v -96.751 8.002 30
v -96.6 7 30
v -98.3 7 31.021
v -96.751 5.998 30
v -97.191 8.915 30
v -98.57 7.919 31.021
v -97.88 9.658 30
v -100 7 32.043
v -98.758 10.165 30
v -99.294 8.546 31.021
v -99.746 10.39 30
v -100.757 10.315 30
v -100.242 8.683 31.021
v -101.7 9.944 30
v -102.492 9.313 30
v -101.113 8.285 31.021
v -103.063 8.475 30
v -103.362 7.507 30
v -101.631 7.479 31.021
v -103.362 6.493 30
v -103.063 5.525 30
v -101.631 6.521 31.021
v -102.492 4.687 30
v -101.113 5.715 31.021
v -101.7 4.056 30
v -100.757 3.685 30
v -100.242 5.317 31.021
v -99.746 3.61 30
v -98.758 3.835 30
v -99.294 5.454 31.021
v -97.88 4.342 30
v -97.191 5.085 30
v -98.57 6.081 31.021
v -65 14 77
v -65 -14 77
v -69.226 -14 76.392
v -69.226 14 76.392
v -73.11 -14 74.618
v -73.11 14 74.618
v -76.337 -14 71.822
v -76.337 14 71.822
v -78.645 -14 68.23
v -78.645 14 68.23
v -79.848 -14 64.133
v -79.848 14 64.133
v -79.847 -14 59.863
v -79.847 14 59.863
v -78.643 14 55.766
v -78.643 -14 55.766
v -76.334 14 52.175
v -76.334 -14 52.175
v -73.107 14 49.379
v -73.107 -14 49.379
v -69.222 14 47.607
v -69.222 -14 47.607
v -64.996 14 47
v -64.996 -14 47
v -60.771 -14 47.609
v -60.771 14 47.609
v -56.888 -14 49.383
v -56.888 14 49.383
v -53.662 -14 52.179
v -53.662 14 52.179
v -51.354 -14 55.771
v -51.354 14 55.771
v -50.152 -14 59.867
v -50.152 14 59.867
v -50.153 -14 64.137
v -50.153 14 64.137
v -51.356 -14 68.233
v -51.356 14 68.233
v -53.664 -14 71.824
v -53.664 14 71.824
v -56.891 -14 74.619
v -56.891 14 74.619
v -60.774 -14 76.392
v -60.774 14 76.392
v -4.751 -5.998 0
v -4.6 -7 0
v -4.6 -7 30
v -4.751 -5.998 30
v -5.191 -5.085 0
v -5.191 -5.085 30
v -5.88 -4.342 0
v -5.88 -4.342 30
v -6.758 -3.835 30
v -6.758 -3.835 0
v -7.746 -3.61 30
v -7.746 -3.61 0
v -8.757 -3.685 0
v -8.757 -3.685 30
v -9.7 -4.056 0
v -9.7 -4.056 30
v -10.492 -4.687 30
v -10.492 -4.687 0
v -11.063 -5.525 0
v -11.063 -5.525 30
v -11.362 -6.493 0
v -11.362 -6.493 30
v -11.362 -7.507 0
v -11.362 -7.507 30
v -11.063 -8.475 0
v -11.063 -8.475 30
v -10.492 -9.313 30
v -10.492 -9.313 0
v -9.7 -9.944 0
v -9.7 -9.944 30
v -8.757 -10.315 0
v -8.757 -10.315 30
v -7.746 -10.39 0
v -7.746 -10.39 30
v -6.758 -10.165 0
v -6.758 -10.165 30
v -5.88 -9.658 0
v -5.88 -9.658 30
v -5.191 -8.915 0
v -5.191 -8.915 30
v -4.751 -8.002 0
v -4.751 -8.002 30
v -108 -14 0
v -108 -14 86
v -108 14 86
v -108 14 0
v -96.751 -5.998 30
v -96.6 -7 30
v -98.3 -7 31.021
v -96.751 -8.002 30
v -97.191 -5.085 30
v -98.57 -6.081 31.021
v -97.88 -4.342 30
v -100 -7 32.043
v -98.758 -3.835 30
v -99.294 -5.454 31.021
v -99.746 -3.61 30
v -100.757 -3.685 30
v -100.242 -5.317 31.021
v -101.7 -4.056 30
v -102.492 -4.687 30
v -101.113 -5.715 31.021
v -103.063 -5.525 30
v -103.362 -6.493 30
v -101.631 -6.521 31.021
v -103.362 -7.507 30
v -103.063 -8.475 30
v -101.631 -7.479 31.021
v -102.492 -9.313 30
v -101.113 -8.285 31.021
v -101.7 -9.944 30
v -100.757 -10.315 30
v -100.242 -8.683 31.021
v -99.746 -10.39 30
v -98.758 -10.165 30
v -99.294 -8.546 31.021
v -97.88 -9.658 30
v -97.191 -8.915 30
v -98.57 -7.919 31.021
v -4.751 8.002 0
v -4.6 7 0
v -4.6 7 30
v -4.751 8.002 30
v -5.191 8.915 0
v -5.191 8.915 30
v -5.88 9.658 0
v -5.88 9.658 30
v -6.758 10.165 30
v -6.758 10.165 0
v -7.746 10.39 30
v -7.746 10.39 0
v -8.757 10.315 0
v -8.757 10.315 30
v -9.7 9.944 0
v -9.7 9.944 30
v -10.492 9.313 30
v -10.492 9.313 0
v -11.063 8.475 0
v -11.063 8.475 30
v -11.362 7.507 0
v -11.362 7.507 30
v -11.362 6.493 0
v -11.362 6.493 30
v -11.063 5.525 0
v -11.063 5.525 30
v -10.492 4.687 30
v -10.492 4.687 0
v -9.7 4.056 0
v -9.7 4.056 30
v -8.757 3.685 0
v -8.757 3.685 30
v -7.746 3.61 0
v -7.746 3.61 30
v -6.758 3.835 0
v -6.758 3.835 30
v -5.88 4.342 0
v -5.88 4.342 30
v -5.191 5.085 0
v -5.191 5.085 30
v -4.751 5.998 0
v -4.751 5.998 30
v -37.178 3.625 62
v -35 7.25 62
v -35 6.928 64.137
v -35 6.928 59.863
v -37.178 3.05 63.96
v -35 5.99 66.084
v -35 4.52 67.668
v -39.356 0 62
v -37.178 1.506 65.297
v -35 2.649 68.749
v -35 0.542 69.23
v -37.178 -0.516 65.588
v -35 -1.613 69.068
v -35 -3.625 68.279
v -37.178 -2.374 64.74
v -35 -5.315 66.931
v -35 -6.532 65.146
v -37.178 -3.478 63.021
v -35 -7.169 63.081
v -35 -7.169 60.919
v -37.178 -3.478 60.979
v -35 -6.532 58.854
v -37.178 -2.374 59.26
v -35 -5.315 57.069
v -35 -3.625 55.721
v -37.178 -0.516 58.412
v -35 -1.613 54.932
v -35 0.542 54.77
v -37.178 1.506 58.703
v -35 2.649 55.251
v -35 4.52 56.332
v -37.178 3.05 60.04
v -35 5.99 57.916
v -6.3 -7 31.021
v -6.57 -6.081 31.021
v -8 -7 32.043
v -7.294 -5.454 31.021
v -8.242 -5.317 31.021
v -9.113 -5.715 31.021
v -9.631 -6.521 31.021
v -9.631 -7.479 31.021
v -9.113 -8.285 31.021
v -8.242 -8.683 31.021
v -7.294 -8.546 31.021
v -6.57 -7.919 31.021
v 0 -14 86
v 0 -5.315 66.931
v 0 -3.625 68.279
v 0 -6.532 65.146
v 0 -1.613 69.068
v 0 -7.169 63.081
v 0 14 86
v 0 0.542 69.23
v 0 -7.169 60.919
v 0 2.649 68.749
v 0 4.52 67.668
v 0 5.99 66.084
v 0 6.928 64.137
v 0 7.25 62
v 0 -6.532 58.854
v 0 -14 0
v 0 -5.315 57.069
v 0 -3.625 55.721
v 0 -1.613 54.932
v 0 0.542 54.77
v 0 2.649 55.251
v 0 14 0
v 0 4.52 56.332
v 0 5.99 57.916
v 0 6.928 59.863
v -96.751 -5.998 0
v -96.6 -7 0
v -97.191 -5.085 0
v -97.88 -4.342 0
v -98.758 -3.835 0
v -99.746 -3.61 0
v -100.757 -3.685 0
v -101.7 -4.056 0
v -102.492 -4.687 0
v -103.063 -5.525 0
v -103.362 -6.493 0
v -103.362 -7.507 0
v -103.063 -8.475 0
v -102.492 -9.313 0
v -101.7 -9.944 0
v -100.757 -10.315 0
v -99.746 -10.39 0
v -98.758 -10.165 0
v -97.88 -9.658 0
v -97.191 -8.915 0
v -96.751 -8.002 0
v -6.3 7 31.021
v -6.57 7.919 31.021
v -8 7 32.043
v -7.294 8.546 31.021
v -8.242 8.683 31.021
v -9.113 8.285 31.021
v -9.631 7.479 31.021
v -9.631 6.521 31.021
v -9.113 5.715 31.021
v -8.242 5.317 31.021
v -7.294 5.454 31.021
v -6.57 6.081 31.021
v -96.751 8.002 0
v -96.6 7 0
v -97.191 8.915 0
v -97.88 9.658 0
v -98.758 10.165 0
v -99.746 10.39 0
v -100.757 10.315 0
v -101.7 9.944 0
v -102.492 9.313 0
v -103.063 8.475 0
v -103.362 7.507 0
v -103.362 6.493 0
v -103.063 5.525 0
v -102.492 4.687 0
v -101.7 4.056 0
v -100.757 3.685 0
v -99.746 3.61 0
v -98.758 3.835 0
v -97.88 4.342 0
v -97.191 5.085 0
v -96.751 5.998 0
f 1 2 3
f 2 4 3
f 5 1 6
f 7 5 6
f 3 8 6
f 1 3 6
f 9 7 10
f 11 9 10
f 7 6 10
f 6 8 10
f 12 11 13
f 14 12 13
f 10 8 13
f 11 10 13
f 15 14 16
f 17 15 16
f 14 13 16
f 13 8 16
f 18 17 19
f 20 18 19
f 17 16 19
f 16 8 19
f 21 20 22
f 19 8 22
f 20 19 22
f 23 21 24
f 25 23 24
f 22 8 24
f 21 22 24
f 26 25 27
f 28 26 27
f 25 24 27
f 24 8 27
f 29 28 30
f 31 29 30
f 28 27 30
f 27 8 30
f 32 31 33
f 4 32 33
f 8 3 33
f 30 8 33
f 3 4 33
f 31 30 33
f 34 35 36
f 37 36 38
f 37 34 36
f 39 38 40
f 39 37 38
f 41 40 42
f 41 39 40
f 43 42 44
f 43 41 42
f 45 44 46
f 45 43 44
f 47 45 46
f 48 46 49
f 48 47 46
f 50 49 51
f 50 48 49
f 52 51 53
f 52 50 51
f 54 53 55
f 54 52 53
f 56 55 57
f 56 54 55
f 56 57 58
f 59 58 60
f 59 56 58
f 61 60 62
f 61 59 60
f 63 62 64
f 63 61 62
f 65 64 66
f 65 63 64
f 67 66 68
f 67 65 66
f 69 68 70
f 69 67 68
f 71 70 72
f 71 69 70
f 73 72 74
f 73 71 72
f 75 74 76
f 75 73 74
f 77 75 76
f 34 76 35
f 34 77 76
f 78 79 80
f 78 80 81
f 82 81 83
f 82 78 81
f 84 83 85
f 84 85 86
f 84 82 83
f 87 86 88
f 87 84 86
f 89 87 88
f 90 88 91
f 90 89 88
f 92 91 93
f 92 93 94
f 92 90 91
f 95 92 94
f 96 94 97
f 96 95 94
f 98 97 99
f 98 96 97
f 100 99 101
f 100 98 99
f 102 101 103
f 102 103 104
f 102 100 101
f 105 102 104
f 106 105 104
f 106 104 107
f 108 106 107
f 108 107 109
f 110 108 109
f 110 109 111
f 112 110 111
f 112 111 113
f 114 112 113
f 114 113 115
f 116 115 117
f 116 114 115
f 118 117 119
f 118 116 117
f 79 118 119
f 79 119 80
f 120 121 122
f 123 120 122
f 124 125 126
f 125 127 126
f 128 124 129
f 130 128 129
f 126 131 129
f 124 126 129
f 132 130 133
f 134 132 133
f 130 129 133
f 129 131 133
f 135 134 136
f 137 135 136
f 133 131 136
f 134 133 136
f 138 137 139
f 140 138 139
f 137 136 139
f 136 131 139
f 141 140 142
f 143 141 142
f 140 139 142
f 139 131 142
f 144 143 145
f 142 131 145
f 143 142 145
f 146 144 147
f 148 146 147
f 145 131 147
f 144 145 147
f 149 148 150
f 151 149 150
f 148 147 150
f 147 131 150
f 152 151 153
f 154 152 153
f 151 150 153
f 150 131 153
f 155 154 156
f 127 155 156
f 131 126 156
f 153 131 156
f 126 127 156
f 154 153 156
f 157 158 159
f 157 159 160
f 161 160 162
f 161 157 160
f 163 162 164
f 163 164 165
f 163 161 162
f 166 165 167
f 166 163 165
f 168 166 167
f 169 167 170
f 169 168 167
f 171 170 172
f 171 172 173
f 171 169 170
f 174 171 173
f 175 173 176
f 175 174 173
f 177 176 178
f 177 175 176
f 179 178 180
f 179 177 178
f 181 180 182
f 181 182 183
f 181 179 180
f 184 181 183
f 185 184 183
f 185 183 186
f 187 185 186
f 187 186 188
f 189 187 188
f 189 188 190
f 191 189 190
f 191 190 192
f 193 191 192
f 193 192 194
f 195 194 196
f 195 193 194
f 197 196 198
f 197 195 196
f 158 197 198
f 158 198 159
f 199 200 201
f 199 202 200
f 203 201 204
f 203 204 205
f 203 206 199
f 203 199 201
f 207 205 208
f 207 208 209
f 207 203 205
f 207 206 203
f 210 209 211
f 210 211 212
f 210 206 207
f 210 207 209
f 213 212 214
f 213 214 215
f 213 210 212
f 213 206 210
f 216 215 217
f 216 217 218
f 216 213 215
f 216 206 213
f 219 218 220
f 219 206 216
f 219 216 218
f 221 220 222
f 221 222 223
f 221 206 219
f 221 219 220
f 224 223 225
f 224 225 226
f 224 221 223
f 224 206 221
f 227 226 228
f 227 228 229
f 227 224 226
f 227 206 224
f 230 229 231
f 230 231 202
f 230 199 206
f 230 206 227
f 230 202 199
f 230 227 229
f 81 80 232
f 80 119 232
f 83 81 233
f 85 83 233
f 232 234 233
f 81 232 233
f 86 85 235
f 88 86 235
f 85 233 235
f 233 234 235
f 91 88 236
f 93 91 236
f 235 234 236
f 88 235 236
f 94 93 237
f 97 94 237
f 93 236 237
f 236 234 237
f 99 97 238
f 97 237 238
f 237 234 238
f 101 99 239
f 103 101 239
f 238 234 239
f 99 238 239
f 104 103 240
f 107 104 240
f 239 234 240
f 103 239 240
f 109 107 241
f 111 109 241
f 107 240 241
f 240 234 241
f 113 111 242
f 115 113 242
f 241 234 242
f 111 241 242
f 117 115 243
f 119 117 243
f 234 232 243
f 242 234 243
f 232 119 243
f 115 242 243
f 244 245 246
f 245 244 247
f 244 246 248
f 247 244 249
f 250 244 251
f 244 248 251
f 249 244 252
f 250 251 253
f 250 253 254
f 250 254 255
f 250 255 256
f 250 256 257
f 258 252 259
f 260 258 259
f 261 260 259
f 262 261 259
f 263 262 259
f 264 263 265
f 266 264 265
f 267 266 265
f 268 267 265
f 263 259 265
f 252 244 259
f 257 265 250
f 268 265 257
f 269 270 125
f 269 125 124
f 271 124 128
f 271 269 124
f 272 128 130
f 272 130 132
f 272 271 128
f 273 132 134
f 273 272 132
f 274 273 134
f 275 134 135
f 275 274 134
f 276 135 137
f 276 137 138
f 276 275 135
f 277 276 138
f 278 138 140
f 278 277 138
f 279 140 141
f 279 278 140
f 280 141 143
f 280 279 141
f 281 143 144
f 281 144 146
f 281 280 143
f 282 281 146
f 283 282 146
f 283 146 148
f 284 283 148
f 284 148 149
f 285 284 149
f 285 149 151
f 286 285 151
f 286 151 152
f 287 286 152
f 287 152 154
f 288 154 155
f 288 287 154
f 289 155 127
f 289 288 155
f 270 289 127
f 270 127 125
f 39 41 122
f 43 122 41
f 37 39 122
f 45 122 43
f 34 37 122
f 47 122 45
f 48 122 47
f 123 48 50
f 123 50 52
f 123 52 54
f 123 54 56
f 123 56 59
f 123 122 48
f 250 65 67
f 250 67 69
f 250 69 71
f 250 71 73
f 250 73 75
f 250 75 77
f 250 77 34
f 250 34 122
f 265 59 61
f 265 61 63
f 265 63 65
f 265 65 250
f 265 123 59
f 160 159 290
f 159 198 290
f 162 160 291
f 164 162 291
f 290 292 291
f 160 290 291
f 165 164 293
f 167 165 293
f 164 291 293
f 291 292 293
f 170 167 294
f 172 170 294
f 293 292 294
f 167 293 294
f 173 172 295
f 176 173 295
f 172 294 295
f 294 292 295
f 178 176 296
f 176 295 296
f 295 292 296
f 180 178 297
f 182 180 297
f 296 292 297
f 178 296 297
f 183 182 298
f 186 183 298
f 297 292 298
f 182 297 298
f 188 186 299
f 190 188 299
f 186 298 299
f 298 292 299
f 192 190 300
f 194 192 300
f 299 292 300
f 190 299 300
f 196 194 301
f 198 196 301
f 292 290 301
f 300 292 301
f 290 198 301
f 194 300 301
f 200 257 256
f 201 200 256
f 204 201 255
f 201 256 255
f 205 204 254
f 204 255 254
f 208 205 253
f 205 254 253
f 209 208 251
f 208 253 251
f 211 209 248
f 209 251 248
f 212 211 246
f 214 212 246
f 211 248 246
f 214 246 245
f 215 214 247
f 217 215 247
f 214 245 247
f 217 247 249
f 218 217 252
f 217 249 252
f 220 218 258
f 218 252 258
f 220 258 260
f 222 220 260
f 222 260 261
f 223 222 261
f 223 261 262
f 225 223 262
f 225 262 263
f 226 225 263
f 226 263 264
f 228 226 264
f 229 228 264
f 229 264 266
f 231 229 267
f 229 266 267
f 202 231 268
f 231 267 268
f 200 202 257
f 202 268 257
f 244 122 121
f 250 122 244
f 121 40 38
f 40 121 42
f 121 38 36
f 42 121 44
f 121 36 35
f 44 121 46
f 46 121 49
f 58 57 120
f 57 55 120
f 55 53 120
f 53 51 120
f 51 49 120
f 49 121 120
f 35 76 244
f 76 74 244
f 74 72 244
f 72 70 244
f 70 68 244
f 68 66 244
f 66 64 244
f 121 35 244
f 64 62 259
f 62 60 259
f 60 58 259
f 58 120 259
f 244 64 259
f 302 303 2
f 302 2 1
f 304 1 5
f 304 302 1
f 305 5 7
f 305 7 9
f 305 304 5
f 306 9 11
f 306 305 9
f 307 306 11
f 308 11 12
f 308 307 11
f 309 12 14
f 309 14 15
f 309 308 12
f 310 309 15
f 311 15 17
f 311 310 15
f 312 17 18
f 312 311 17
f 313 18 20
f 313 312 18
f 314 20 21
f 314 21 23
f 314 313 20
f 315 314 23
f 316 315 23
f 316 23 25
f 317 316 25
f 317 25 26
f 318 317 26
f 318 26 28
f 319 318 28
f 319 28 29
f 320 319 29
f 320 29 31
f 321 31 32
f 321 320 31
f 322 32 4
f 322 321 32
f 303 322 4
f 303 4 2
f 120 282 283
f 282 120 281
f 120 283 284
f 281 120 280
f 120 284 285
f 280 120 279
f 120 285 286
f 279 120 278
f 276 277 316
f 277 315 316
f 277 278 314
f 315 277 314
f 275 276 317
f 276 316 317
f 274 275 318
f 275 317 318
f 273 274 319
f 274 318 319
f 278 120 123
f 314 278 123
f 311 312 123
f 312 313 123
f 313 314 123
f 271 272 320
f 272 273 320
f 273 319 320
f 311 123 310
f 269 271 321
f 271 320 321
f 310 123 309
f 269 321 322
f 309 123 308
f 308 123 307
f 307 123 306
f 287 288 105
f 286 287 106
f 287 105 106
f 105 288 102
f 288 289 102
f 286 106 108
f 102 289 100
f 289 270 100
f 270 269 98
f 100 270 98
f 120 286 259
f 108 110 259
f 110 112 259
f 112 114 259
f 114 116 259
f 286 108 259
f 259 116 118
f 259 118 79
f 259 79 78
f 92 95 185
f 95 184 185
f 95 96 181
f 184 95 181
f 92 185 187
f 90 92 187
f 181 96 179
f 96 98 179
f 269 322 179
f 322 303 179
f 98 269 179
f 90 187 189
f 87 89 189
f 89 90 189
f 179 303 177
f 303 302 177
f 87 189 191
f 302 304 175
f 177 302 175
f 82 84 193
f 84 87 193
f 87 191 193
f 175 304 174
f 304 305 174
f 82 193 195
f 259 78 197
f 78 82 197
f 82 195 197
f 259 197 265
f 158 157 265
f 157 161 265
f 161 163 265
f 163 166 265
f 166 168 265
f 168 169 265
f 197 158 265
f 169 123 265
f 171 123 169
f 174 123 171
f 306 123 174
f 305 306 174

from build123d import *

# Parameters (mm, degrees)
SKETCH_W             = 108
SKETCH_H             = 28
PAD_DEPTH            = 86
POCKET001_DEPTH      = 14.001
POCKET001_DEPTH_BACK = 14.001
SKETCH003_R          = 3.4
HOLE_DEPTH           = 30
HOLE_TIPS_R          = 3.4
SKETCH001_R          = 7.25
HOLE001_DEPTH        = 35
HOLE001_TIPS_R       = 7.25


with BuildPart() as part:
    # Sketch → Pad (new body)
    with BuildSketch(Plane.XY):
        with Locations((-54, 0)):
            Rectangle(SKETCH_W, SKETCH_H)
    extrude(amount=PAD_DEPTH)

    # Sketch002 → Pocket001 (cut, two sides)
    with BuildSketch(Plane.XZ) as pocket001_sk:
        with BuildLine():
            ThreePointArc((-64.995977, 47), (-50, 62.002011), (-65, 77))
            ThreePointArc((-65, 77), (-80, 61.997989), (-64.995977, 47))
        make_face()
    extrude(amount=-POCKET001_DEPTH, mode=Mode.SUBTRACT)
    extrude(pocket001_sk.sketch, amount=POCKET001_DEPTH_BACK, mode=Mode.SUBTRACT)

    # Sketch003 → Hole (cut)
    with BuildSketch(Plane.XY):
        with Locations((-100, 7)):
            Circle(SKETCH003_R)
        with Locations((-100, -7)):
            Circle(SKETCH003_R)
        with Locations((-8, 7)):
            Circle(SKETCH003_R)
        with Locations((-8, -7)):
            Circle(SKETCH003_R)
    extrude(amount=HOLE_DEPTH, mode=Mode.SUBTRACT)

    # Hole tips → Hole tip 1 section 0
    with BuildSketch(Plane.XY.offset(30), mode=Mode.PRIVATE) as hole_tip_1_s0:
        with Locations((-100, 7)):
            Circle(HOLE_TIPS_R)
    loft([hole_tip_1_s0.sketch, Vertex(-100, 7, 32.042926)], mode=Mode.SUBTRACT)

    # Hole tips → Hole tip 2 section 0
    with BuildSketch(Plane.XY.offset(30), mode=Mode.PRIVATE) as hole_tip_2_s0:
        with Locations((-100, -7)):
            Circle(HOLE_TIPS_R)
    loft([hole_tip_2_s0.sketch, Vertex(-100, -7, 32.042926)], mode=Mode.SUBTRACT)

    # Hole tips → Hole tip 3 section 0
    with BuildSketch(Plane.XY.offset(30), mode=Mode.PRIVATE) as hole_tip_3_s0:
        with Locations((-8, 7)):
            Circle(HOLE_TIPS_R)
    loft([hole_tip_3_s0.sketch, Vertex(-8, 7, 32.042926)], mode=Mode.SUBTRACT)

    # Hole tips → Hole tip 4 section 0
    with BuildSketch(Plane.XY.offset(30), mode=Mode.PRIVATE) as hole_tip_4_s0:
        with Locations((-8, -7)):
            Circle(HOLE_TIPS_R)
    loft([hole_tip_4_s0.sketch, Vertex(-8, -7, 32.042926)], mode=Mode.SUBTRACT)

    # Sketch001 → Hole001 (cut)
    with BuildSketch(Plane.YZ):
        with Locations((0, 62)):
            Circle(SKETCH001_R)
    extrude(amount=-HOLE001_DEPTH, mode=Mode.SUBTRACT)

    # Hole001 tips → Hole001 tip 1 section 0
    with BuildSketch(Plane.YZ.offset(-35), mode=Mode.PRIVATE) as hole001_tip_1_s0:
        with Locations((0, 62)):
            Circle(HOLE001_TIPS_R)
    loft([hole001_tip_1_s0.sketch, Vertex(-39.356239, 0, 62)], mode=Mode.SUBTRACT)


solid = part.part
